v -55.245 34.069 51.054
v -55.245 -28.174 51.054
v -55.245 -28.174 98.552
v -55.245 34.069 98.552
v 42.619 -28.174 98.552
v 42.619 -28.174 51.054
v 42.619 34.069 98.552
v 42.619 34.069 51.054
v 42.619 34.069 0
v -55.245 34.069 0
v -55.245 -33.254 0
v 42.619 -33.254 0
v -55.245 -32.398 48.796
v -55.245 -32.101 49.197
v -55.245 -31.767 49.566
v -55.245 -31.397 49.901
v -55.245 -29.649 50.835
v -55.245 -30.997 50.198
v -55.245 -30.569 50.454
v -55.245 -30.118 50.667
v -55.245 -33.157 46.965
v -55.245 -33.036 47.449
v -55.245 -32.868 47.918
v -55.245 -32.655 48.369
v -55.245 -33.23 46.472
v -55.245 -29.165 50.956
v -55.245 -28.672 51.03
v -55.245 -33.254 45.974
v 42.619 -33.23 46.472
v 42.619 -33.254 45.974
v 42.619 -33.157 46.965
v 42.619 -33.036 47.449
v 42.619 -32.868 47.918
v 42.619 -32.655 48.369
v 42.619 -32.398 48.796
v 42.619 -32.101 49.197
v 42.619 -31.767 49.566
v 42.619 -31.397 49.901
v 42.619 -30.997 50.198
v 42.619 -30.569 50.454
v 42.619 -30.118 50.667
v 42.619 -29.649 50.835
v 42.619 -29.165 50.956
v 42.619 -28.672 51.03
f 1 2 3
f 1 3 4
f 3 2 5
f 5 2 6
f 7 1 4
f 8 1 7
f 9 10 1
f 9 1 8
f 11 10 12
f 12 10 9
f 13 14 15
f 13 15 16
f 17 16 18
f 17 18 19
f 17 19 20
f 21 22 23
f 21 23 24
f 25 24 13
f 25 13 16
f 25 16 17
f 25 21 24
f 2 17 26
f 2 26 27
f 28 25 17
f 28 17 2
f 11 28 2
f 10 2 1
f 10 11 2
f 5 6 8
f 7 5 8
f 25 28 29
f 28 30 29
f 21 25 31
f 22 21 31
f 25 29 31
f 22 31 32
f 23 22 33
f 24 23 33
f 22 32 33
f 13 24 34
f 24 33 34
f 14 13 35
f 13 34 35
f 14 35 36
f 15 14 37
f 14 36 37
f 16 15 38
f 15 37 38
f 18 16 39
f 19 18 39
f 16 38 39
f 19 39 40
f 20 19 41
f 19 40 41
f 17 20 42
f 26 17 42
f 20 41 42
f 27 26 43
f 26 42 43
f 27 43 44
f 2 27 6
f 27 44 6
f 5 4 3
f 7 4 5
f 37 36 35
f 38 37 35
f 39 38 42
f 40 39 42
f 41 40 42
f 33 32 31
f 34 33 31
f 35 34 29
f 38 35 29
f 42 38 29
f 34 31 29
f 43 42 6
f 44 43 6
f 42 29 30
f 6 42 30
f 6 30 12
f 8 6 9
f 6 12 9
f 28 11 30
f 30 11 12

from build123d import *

# Parameters (mm, degrees)
F0_W      = 97.864177
F0_H      = 67.323104
F1_DEPTH  = 51.054
F2_R      = 5.08
F1_FACE_W = 97.864178
F1_FACE_H = 62.243104
F3_DEPTH  = 47.498


with BuildPart() as f1:
    # F0 (on Top) → F1 (new body)
    with BuildSketch(Plane.XY):
        with Locations((-6.312856, 0.407133)):
            Rectangle(F0_W, F0_H)
    extrude(amount=F1_DEPTH)

    # F2
    f2_edges = [f1.edges().sort_by_distance(p)[0] for p in [
        (-6.312856, -33.254419, 51.054),
    ]]
    fillet(f2_edges, radius=F2_R)

    # F1_face (on face) → F3 (join)
    with BuildSketch(Plane(origin=(-6.312856, 2.947133, 51.054), x_dir=(1, 0, 0), z_dir=(0, 0, 1))):
        Rectangle(F1_FACE_W, F1_FACE_H)
    extrude(amount=F3_DEPTH)


solid = f1.part
